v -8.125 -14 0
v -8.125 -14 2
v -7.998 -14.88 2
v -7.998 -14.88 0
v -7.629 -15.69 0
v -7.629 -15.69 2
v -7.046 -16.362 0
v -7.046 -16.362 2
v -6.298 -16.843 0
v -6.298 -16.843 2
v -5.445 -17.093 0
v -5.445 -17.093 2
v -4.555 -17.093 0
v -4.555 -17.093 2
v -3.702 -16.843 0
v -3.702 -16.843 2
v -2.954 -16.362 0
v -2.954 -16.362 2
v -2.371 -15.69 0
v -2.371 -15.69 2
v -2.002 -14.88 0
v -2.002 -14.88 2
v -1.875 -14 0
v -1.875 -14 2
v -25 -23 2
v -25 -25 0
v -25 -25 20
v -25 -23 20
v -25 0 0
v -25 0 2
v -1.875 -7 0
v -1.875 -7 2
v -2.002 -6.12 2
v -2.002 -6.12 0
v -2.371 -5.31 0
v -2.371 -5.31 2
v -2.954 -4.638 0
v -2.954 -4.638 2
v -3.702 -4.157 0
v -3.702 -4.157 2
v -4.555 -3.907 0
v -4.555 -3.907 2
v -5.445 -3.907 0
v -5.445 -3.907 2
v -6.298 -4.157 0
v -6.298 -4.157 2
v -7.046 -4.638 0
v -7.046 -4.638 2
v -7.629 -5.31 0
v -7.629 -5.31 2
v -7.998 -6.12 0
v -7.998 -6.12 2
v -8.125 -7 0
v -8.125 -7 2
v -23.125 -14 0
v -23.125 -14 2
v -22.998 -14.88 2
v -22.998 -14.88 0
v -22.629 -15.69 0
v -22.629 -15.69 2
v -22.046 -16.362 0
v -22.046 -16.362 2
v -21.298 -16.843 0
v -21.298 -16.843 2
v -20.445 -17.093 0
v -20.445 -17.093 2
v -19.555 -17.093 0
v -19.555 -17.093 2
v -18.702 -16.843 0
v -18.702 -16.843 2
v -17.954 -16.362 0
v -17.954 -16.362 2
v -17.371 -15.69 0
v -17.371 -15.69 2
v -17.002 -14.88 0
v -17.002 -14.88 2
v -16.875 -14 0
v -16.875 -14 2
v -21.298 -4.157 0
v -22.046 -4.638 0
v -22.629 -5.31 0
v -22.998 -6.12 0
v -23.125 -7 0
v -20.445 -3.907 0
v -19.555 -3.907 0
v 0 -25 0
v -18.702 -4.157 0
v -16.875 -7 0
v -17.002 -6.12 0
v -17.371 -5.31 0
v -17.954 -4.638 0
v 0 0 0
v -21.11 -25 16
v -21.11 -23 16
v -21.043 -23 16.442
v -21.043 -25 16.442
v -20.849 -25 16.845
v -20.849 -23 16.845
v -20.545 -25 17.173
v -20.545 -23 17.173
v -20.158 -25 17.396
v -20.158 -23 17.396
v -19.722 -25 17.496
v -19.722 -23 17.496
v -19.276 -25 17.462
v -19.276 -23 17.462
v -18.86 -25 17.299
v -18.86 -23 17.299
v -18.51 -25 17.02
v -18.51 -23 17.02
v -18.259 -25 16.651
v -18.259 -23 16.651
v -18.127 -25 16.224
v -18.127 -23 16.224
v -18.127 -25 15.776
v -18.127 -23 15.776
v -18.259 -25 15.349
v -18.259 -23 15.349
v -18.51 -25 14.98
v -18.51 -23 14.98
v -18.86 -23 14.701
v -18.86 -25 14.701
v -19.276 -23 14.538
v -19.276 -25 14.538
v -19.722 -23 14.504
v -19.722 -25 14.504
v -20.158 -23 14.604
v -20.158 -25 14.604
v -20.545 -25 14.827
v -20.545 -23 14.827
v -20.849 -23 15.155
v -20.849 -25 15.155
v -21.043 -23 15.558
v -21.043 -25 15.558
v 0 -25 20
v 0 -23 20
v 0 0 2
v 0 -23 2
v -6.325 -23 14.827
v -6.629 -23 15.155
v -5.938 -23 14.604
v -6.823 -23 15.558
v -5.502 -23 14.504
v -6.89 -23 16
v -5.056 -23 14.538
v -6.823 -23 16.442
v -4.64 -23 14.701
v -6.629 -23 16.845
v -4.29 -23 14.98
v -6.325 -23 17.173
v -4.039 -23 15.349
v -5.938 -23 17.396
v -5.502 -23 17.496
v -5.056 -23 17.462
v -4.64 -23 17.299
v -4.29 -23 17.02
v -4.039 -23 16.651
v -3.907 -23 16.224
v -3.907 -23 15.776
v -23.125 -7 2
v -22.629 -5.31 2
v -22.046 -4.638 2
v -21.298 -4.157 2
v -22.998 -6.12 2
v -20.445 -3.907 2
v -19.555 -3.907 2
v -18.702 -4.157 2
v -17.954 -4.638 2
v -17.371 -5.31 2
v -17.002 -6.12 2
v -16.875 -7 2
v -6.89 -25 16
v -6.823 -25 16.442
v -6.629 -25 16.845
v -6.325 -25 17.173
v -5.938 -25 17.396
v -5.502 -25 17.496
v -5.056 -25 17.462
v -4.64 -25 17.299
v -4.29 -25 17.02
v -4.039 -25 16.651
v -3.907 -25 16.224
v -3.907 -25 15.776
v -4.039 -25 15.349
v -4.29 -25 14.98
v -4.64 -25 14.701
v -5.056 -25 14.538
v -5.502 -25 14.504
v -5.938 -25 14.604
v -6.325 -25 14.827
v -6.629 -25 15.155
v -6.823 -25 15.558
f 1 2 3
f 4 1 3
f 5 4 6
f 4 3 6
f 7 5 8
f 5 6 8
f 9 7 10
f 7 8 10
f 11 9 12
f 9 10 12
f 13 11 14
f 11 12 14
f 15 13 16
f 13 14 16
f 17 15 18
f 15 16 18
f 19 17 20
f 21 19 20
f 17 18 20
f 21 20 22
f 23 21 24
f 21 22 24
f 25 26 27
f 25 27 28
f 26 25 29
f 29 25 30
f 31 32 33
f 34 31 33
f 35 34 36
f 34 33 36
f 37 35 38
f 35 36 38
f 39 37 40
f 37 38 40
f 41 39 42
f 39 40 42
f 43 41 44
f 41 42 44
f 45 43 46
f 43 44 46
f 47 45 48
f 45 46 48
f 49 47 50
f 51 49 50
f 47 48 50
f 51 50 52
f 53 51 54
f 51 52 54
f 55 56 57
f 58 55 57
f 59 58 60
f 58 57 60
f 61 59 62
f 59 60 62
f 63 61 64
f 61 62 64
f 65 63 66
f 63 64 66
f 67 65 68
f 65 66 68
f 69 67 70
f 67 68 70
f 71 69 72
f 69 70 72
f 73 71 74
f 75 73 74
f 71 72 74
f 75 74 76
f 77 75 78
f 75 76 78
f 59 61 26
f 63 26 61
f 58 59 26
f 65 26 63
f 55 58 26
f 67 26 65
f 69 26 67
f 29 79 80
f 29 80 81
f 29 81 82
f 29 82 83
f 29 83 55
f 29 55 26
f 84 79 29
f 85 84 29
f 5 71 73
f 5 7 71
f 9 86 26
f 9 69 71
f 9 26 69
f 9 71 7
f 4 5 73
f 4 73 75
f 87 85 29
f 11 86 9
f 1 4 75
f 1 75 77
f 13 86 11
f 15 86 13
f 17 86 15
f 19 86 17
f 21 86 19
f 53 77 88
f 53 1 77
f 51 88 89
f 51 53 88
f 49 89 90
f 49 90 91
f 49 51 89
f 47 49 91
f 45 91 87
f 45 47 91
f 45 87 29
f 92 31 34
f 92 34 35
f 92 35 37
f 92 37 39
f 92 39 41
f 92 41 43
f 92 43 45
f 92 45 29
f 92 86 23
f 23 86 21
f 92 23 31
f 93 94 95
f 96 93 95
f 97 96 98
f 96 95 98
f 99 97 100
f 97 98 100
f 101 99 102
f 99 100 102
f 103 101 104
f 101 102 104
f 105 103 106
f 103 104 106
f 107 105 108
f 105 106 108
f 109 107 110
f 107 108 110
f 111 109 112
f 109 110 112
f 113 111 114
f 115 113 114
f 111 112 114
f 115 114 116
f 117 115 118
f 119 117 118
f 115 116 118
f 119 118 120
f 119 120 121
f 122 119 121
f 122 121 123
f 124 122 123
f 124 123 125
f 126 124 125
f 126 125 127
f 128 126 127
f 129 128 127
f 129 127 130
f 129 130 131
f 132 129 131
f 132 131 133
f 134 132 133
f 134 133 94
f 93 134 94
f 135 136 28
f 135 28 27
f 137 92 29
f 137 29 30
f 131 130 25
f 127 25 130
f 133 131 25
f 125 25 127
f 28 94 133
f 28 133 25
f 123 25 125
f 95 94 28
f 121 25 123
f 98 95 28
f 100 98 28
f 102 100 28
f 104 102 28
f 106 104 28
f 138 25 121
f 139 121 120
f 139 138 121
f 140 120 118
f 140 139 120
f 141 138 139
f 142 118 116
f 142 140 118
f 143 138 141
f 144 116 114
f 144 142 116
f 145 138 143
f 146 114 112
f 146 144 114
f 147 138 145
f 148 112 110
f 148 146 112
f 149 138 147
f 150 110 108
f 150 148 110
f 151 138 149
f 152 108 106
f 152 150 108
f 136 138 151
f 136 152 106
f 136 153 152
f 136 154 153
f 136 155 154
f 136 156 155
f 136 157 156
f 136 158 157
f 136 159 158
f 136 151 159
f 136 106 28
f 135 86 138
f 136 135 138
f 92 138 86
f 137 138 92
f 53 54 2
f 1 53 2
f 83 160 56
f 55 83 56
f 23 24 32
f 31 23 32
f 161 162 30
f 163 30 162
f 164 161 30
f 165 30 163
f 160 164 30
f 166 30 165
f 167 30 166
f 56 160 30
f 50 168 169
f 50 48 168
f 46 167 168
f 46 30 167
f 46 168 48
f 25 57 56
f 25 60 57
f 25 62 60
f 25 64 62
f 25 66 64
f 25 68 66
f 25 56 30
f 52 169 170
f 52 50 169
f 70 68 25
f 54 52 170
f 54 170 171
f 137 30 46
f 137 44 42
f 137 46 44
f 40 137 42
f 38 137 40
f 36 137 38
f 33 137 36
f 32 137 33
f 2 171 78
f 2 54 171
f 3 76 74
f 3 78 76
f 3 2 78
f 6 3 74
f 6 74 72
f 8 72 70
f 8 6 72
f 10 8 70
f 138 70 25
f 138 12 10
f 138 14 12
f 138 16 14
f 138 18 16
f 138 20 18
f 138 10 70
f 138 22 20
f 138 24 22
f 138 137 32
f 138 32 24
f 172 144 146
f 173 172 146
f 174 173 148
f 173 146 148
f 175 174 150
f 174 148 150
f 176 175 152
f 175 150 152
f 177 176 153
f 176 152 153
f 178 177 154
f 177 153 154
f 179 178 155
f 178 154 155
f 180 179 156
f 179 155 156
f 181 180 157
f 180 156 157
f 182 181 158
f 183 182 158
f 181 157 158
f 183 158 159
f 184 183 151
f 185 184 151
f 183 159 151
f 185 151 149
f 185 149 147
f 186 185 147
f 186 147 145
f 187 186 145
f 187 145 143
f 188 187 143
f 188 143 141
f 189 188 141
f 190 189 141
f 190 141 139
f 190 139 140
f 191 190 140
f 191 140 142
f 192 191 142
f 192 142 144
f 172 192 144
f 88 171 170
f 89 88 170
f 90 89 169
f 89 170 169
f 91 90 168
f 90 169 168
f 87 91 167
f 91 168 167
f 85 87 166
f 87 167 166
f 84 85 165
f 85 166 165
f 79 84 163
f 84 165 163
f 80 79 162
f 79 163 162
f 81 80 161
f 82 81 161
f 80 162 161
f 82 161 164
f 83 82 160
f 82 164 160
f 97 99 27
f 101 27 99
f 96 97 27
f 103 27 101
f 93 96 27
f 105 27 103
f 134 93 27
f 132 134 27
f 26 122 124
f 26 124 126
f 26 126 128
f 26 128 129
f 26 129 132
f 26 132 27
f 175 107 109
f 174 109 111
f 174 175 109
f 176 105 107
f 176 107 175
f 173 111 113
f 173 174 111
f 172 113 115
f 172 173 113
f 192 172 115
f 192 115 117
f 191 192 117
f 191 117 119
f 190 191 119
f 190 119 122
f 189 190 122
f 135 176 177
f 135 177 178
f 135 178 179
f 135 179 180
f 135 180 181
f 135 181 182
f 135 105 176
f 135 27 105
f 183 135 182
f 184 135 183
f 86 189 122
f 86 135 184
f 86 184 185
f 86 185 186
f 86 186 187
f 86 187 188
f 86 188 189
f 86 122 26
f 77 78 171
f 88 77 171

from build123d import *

# Parameters (mm, degrees)
F1_DEPTH = 25
F3_DEPTH = 25
F4_R     = 1.5
F5_DEPTH = 25


with BuildPart() as f1:
    # F0 (on Right) → F1 (new body)
    with BuildSketch(Plane.YZ):
        Polygon((-25, 0), (0, 0), (0, 2), (-23, 2), (-23, 20), (-25, 20), align=None)
    extrude(amount=-F1_DEPTH)

    # F2 (on face) → F3 (cut)
    with BuildSketch(Plane.XY.offset(2)):
        with BuildLine():
            Line((-16.875, -14), (-16.875, -7))
            ThreePointArc((-16.875, -7), (-20, -3.875), (-23.125, -7))
            Line((-23.125, -7), (-23.125, -14))
            ThreePointArc((-23.125, -14), (-20, -17.125), (-16.875, -14))
        make_face()
        with BuildLine():
            Line((-1.875, -14), (-1.875, -7))
            ThreePointArc((-1.875, -7), (-5, -3.875), (-8.125, -7))
            Line((-8.125, -7), (-8.125, -14))
            ThreePointArc((-8.125, -14), (-5, -17.125), (-1.875, -14))
        make_face()
    extrude(amount=-F3_DEPTH, mode=Mode.SUBTRACT)

    # F4 (on face) → F5 (cut)
    with BuildSketch(Plane(origin=(0, -23, 0), x_dir=(-1, 0, 0), z_dir=(0, 1, 0))):
        with Locations((5.39, 16)):
            Circle(F4_R)
        with Locations((19.61, 16)):
            Circle(F4_R)
    extrude(amount=-F5_DEPTH, mode=Mode.SUBTRACT)


solid = f1.part
